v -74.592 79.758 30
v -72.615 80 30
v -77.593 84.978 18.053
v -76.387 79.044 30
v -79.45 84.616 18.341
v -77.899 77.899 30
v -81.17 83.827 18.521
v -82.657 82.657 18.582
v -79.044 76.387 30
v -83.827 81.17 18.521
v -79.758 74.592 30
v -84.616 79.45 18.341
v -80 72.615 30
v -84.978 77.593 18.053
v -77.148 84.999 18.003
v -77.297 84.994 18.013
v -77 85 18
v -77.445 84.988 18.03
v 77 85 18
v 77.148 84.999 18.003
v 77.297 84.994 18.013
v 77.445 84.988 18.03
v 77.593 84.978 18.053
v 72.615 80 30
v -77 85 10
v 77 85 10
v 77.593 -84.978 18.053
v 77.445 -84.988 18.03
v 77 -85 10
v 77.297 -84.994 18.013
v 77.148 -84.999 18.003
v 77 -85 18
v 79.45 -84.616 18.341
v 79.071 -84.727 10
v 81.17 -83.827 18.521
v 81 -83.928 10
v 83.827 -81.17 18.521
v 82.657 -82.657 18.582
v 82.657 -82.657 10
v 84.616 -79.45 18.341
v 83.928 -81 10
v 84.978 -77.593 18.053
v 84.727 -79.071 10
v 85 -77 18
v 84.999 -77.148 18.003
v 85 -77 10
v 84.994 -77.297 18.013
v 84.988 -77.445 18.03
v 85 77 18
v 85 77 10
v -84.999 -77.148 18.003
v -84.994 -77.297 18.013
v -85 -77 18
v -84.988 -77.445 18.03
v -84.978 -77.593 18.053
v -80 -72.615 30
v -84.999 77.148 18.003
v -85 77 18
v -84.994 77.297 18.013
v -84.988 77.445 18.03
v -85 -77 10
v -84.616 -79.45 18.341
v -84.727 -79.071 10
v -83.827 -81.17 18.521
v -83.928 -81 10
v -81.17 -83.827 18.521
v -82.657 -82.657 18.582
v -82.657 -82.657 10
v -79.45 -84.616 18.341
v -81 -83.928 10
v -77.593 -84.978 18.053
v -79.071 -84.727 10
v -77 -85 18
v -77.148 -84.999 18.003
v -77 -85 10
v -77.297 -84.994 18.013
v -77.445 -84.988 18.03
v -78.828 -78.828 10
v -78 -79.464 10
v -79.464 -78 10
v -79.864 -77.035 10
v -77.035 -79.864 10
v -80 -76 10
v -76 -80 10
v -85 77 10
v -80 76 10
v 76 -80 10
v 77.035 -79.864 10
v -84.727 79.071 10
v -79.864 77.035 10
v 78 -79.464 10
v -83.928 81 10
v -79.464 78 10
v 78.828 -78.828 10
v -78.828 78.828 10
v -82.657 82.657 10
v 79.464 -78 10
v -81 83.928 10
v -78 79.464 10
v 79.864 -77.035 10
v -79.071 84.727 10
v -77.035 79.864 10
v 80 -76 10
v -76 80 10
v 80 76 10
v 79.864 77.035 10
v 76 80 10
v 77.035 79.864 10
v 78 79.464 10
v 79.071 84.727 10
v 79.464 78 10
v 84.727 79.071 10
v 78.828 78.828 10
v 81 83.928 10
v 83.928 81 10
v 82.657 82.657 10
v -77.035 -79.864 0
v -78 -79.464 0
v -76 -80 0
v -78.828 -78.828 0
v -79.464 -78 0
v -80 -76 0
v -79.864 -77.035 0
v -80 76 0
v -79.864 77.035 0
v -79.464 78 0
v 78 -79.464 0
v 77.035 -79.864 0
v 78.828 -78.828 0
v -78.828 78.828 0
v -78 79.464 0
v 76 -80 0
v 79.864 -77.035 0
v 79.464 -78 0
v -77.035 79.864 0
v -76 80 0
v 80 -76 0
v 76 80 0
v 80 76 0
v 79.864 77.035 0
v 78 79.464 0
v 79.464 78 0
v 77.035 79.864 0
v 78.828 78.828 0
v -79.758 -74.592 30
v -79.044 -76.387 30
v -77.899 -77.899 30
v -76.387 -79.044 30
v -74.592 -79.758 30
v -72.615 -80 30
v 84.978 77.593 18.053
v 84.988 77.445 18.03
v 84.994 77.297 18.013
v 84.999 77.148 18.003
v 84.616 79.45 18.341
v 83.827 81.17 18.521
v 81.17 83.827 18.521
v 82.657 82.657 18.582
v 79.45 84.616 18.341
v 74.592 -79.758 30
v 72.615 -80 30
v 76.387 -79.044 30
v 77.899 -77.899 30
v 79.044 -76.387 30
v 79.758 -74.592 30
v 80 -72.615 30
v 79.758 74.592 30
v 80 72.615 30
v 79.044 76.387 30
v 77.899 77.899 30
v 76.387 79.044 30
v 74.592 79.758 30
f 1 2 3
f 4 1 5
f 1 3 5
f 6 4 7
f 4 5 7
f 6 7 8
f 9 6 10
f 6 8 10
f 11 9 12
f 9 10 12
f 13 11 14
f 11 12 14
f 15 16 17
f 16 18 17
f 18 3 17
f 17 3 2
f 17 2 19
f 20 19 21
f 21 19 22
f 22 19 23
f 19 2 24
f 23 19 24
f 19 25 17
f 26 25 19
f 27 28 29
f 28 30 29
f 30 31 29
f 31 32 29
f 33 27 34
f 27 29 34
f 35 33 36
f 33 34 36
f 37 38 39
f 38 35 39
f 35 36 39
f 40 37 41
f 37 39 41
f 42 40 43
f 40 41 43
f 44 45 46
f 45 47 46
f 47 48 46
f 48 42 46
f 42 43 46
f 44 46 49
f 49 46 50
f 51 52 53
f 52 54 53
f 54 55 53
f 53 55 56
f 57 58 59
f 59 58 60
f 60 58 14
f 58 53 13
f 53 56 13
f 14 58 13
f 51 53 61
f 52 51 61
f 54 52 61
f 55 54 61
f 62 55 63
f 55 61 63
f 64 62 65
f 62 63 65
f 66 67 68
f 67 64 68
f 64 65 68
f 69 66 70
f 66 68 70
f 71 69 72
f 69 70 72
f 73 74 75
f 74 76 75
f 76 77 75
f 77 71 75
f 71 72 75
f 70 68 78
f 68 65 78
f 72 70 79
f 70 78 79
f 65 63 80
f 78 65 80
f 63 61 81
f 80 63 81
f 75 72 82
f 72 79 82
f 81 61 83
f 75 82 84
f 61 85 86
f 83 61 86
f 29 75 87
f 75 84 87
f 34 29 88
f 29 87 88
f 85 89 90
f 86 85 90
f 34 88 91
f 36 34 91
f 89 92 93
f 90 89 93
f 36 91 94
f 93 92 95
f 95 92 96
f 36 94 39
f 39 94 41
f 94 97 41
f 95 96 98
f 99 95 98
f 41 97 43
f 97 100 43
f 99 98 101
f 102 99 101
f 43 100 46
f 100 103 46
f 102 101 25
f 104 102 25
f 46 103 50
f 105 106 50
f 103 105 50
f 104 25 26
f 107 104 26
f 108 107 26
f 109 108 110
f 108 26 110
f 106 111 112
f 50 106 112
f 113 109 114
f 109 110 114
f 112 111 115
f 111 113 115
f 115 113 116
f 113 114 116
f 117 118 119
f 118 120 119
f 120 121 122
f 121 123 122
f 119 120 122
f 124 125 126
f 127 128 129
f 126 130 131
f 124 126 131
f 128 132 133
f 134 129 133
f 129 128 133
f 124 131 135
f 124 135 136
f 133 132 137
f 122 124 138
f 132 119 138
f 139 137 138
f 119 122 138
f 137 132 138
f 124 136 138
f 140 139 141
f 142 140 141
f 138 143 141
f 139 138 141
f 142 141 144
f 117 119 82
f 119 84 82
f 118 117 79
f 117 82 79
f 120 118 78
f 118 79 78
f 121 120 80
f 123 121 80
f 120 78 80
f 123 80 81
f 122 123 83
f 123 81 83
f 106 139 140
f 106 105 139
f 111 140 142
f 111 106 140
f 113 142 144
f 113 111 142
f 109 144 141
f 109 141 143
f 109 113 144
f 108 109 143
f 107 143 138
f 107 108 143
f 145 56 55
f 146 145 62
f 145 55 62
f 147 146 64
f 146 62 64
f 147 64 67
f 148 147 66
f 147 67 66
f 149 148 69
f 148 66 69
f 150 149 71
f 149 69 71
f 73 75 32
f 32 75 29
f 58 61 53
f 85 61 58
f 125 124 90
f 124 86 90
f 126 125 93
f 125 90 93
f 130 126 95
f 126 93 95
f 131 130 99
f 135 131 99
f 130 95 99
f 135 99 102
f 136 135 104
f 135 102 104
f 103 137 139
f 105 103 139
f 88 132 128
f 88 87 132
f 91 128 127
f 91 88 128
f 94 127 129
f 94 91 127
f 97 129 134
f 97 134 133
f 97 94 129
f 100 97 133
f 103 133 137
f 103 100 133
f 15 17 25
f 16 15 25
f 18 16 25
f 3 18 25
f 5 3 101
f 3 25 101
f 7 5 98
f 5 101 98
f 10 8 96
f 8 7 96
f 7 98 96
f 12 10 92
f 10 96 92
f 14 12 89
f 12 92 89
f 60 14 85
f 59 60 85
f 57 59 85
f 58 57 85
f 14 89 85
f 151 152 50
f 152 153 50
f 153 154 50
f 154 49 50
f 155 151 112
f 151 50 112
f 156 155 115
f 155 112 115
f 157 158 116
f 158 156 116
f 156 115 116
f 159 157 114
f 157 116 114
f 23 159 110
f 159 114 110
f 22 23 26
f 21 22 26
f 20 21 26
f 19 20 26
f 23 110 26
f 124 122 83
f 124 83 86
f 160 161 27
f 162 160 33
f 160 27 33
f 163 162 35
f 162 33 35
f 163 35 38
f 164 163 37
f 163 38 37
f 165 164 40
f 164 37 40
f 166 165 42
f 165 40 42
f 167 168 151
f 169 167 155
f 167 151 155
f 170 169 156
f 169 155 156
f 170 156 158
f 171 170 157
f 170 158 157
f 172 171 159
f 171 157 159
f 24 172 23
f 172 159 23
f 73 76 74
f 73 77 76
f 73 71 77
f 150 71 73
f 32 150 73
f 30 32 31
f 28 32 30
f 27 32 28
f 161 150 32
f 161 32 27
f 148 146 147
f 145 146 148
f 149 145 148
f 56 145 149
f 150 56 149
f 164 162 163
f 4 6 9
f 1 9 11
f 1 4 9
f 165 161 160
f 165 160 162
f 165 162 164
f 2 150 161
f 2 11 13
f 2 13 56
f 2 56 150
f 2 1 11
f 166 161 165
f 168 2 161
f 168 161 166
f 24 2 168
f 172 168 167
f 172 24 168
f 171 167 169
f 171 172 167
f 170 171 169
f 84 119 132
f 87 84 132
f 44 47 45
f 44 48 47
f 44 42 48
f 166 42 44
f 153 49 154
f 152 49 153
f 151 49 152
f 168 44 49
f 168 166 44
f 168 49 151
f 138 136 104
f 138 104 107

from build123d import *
from OCP.BRepFilletAPI import BRepFilletAPI_MakeChamfer

# Parameters (mm, degrees)
SKIZZE1_W                       = 160
SKIZZE1_H                       = 160
AUFSATZ_LINEAR_AUSTRAGEN1_DEPTH = 10
SKIZZE2_W                       = 170
SKIZZE2_H                       = 170
AUFSATZ_LINEAR_AUSTRAGEN2_DEPTH = 20
FASE1_SIZE                      = 12
FASE1_SIZE2                     = 5
VERRUNDUNG1_R                   = 8
VERRUNDUNG2_R                   = 4


with BuildPart() as part:
    # Skizze1 → Aufsatz-Linear austragen1 (new body)
    with BuildSketch(Plane.XY):
        Rectangle(SKIZZE1_W, SKIZZE1_H)
    extrude(amount=AUFSATZ_LINEAR_AUSTRAGEN1_DEPTH)

    # Skizze2 → Aufsatz-Linear austragen2 (add)
    with BuildSketch(Plane.XY.offset(10)):
        Rectangle(SKIZZE2_W, SKIZZE2_H)
    extrude(amount=AUFSATZ_LINEAR_AUSTRAGEN2_DEPTH)

    # Fase1: one chamfer whose edges measure the first distance from different faces: ONE call of the kernel's chamfer builder (chamfer() names one face for all edges)
    fase1_edges_1 = [part.edges().sort_by_distance(p)[0] for p in [
        (85, 0, 30),
    ]]
    fase1_side_1 = [part.faces().sort_by_distance(p)[0] for p in [
        (85, 0, 20),
    ]]
    fase1_edges_2 = [part.edges().sort_by_distance(p)[0] for p in [
        (0, 85, 30),
    ]]
    fase1_side_2 = [part.faces().sort_by_distance(p)[0] for p in [
        (0, 85, 20),
    ]]
    fase1_edges_3 = [part.edges().sort_by_distance(p)[0] for p in [
        (-85, 0, 30),
    ]]
    fase1_side_3 = [part.faces().sort_by_distance(p)[0] for p in [
        (-85, 0, 20),
    ]]
    fase1_edges_4 = [part.edges().sort_by_distance(p)[0] for p in [
        (0, -85, 30),
    ]]
    fase1_side_4 = [part.faces().sort_by_distance(p)[0] for p in [
        (0, -85, 20),
    ]]
    fase1 = BRepFilletAPI_MakeChamfer(part.part.solid().wrapped)
    for e in fase1_edges_1:
        fase1.Add(FASE1_SIZE, FASE1_SIZE2, e.wrapped, fase1_side_1[0].wrapped)  # the first distance lies on this face
    for e in fase1_edges_2:
        fase1.Add(FASE1_SIZE, FASE1_SIZE2, e.wrapped, fase1_side_2[0].wrapped)  # the first distance lies on this face
    for e in fase1_edges_3:
        fase1.Add(FASE1_SIZE, FASE1_SIZE2, e.wrapped, fase1_side_3[0].wrapped)  # the first distance lies on this face
    for e in fase1_edges_4:
        fase1.Add(FASE1_SIZE, FASE1_SIZE2, e.wrapped, fase1_side_4[0].wrapped)  # the first distance lies on this face
    add(Compound.cast(fase1.Shape()), mode=Mode.REPLACE)

    # Verrundung1
    # the kernel refuses this fillet: 8 mm, written as the material it takes off along each edge
    with BuildSketch(Plane(origin=(85, 85, -10), x_dir=(0, -1, 0), z_dir=(0, 0, 1)), Plane(origin=(85, -85, -10), x_dir=(-1, 0, 0), z_dir=(0, 0, 1))) as verrundung1_piece_1:
        with BuildLine():
            CenterArc((VERRUNDUNG1_R, -VERRUNDUNG1_R), VERRUNDUNG1_R, 90, 90)
            Line((0, -VERRUNDUNG1_R), (0, 0))
            Line((0, 0), (VERRUNDUNG1_R, 0))
        make_face()
    extrude(amount=48, mode=Mode.SUBTRACT)
    with BuildSketch(Plane(origin=(-85, -85, -10), x_dir=(1, 0, 0), z_dir=(0, 0, 1)), Plane(origin=(-85, 85, -10), x_dir=(0, -1, 0), z_dir=(0, 0, 1))) as verrundung1_piece_2:
        with BuildLine():
            CenterArc((VERRUNDUNG1_R, VERRUNDUNG1_R), VERRUNDUNG1_R, 180, 90)
            Line((0, VERRUNDUNG1_R), (0, 0))
            Line((0, 0), (VERRUNDUNG1_R, 0))
        make_face()
    extrude(amount=48, mode=Mode.SUBTRACT)
    with BuildSketch(Plane(origin=(-91.18556701, -91.18556701, 3.154639175), x_dir=(0.9333456062030596, -0.13806887665725864, -0.331365303977417), z_dir=(0.358979079308869, 0.35897907930886913, 0.8615497903412858)), Plane(origin=(-91.18556701, 91.18556701, 3.154639175), x_dir=(-0.13806887665725653, -0.9333456062030596, -0.3313653039774179), z_dir=(0.35897907930886913, -0.358979079308869, 0.8615497903412858))) as verrundung1_piece_3:
        with BuildLine():
            CenterArc((VERRUNDUNG1_R * 0.861549790341, VERRUNDUNG1_R), VERRUNDUNG1_R, 188.506927756, 81.493072244)
            Line((-VERRUNDUNG1_R * 0.127448193837, VERRUNDUNG1_R * 0.852071005917), (0, 0))
            Line((0, 0), (VERRUNDUNG1_R * 0.861549790341, 0))
        make_face()
    extrude(amount=48.390379891, mode=Mode.SUBTRACT)
    with BuildSketch(Plane(origin=(91.18556701, -91.18556701, 3.154639175), x_dir=(-0.9333456062030596, -0.13806887665725678, -0.331365303977418), z_dir=(-0.35897907930886913, 0.358979079308869, 0.8615497903412858)), Plane(origin=(91.18556701, 91.18556701, 3.154639175), x_dir=(0.13806887665725714, -0.9333456062030596, -0.33136530397741776), z_dir=(-0.358979079308869, -0.35897907930886913, 0.8615497903412858))) as verrundung1_piece_4:
        with BuildLine():
            CenterArc((VERRUNDUNG1_R * 0.861549790341, -VERRUNDUNG1_R), VERRUNDUNG1_R, 90, 81.493072244)
            Line((-VERRUNDUNG1_R * 0.127448193837, -VERRUNDUNG1_R * 0.852071005917), (0, 0))
            Line((0, 0), (VERRUNDUNG1_R * 0.861549790341, 0))
        make_face()
    extrude(amount=48.390379891, mode=Mode.SUBTRACT)

    # Verrundung2
    verrundung2_edges = [part.edges().sort_by_distance(p)[0] for p in [
        (80, -80, 5),
        (-80, -80, 5),
        (-80, 80, 5),
        (80, 80, 5),
    ]]
    fillet(verrundung2_edges, radius=VERRUNDUNG2_R)


solid = part.part
